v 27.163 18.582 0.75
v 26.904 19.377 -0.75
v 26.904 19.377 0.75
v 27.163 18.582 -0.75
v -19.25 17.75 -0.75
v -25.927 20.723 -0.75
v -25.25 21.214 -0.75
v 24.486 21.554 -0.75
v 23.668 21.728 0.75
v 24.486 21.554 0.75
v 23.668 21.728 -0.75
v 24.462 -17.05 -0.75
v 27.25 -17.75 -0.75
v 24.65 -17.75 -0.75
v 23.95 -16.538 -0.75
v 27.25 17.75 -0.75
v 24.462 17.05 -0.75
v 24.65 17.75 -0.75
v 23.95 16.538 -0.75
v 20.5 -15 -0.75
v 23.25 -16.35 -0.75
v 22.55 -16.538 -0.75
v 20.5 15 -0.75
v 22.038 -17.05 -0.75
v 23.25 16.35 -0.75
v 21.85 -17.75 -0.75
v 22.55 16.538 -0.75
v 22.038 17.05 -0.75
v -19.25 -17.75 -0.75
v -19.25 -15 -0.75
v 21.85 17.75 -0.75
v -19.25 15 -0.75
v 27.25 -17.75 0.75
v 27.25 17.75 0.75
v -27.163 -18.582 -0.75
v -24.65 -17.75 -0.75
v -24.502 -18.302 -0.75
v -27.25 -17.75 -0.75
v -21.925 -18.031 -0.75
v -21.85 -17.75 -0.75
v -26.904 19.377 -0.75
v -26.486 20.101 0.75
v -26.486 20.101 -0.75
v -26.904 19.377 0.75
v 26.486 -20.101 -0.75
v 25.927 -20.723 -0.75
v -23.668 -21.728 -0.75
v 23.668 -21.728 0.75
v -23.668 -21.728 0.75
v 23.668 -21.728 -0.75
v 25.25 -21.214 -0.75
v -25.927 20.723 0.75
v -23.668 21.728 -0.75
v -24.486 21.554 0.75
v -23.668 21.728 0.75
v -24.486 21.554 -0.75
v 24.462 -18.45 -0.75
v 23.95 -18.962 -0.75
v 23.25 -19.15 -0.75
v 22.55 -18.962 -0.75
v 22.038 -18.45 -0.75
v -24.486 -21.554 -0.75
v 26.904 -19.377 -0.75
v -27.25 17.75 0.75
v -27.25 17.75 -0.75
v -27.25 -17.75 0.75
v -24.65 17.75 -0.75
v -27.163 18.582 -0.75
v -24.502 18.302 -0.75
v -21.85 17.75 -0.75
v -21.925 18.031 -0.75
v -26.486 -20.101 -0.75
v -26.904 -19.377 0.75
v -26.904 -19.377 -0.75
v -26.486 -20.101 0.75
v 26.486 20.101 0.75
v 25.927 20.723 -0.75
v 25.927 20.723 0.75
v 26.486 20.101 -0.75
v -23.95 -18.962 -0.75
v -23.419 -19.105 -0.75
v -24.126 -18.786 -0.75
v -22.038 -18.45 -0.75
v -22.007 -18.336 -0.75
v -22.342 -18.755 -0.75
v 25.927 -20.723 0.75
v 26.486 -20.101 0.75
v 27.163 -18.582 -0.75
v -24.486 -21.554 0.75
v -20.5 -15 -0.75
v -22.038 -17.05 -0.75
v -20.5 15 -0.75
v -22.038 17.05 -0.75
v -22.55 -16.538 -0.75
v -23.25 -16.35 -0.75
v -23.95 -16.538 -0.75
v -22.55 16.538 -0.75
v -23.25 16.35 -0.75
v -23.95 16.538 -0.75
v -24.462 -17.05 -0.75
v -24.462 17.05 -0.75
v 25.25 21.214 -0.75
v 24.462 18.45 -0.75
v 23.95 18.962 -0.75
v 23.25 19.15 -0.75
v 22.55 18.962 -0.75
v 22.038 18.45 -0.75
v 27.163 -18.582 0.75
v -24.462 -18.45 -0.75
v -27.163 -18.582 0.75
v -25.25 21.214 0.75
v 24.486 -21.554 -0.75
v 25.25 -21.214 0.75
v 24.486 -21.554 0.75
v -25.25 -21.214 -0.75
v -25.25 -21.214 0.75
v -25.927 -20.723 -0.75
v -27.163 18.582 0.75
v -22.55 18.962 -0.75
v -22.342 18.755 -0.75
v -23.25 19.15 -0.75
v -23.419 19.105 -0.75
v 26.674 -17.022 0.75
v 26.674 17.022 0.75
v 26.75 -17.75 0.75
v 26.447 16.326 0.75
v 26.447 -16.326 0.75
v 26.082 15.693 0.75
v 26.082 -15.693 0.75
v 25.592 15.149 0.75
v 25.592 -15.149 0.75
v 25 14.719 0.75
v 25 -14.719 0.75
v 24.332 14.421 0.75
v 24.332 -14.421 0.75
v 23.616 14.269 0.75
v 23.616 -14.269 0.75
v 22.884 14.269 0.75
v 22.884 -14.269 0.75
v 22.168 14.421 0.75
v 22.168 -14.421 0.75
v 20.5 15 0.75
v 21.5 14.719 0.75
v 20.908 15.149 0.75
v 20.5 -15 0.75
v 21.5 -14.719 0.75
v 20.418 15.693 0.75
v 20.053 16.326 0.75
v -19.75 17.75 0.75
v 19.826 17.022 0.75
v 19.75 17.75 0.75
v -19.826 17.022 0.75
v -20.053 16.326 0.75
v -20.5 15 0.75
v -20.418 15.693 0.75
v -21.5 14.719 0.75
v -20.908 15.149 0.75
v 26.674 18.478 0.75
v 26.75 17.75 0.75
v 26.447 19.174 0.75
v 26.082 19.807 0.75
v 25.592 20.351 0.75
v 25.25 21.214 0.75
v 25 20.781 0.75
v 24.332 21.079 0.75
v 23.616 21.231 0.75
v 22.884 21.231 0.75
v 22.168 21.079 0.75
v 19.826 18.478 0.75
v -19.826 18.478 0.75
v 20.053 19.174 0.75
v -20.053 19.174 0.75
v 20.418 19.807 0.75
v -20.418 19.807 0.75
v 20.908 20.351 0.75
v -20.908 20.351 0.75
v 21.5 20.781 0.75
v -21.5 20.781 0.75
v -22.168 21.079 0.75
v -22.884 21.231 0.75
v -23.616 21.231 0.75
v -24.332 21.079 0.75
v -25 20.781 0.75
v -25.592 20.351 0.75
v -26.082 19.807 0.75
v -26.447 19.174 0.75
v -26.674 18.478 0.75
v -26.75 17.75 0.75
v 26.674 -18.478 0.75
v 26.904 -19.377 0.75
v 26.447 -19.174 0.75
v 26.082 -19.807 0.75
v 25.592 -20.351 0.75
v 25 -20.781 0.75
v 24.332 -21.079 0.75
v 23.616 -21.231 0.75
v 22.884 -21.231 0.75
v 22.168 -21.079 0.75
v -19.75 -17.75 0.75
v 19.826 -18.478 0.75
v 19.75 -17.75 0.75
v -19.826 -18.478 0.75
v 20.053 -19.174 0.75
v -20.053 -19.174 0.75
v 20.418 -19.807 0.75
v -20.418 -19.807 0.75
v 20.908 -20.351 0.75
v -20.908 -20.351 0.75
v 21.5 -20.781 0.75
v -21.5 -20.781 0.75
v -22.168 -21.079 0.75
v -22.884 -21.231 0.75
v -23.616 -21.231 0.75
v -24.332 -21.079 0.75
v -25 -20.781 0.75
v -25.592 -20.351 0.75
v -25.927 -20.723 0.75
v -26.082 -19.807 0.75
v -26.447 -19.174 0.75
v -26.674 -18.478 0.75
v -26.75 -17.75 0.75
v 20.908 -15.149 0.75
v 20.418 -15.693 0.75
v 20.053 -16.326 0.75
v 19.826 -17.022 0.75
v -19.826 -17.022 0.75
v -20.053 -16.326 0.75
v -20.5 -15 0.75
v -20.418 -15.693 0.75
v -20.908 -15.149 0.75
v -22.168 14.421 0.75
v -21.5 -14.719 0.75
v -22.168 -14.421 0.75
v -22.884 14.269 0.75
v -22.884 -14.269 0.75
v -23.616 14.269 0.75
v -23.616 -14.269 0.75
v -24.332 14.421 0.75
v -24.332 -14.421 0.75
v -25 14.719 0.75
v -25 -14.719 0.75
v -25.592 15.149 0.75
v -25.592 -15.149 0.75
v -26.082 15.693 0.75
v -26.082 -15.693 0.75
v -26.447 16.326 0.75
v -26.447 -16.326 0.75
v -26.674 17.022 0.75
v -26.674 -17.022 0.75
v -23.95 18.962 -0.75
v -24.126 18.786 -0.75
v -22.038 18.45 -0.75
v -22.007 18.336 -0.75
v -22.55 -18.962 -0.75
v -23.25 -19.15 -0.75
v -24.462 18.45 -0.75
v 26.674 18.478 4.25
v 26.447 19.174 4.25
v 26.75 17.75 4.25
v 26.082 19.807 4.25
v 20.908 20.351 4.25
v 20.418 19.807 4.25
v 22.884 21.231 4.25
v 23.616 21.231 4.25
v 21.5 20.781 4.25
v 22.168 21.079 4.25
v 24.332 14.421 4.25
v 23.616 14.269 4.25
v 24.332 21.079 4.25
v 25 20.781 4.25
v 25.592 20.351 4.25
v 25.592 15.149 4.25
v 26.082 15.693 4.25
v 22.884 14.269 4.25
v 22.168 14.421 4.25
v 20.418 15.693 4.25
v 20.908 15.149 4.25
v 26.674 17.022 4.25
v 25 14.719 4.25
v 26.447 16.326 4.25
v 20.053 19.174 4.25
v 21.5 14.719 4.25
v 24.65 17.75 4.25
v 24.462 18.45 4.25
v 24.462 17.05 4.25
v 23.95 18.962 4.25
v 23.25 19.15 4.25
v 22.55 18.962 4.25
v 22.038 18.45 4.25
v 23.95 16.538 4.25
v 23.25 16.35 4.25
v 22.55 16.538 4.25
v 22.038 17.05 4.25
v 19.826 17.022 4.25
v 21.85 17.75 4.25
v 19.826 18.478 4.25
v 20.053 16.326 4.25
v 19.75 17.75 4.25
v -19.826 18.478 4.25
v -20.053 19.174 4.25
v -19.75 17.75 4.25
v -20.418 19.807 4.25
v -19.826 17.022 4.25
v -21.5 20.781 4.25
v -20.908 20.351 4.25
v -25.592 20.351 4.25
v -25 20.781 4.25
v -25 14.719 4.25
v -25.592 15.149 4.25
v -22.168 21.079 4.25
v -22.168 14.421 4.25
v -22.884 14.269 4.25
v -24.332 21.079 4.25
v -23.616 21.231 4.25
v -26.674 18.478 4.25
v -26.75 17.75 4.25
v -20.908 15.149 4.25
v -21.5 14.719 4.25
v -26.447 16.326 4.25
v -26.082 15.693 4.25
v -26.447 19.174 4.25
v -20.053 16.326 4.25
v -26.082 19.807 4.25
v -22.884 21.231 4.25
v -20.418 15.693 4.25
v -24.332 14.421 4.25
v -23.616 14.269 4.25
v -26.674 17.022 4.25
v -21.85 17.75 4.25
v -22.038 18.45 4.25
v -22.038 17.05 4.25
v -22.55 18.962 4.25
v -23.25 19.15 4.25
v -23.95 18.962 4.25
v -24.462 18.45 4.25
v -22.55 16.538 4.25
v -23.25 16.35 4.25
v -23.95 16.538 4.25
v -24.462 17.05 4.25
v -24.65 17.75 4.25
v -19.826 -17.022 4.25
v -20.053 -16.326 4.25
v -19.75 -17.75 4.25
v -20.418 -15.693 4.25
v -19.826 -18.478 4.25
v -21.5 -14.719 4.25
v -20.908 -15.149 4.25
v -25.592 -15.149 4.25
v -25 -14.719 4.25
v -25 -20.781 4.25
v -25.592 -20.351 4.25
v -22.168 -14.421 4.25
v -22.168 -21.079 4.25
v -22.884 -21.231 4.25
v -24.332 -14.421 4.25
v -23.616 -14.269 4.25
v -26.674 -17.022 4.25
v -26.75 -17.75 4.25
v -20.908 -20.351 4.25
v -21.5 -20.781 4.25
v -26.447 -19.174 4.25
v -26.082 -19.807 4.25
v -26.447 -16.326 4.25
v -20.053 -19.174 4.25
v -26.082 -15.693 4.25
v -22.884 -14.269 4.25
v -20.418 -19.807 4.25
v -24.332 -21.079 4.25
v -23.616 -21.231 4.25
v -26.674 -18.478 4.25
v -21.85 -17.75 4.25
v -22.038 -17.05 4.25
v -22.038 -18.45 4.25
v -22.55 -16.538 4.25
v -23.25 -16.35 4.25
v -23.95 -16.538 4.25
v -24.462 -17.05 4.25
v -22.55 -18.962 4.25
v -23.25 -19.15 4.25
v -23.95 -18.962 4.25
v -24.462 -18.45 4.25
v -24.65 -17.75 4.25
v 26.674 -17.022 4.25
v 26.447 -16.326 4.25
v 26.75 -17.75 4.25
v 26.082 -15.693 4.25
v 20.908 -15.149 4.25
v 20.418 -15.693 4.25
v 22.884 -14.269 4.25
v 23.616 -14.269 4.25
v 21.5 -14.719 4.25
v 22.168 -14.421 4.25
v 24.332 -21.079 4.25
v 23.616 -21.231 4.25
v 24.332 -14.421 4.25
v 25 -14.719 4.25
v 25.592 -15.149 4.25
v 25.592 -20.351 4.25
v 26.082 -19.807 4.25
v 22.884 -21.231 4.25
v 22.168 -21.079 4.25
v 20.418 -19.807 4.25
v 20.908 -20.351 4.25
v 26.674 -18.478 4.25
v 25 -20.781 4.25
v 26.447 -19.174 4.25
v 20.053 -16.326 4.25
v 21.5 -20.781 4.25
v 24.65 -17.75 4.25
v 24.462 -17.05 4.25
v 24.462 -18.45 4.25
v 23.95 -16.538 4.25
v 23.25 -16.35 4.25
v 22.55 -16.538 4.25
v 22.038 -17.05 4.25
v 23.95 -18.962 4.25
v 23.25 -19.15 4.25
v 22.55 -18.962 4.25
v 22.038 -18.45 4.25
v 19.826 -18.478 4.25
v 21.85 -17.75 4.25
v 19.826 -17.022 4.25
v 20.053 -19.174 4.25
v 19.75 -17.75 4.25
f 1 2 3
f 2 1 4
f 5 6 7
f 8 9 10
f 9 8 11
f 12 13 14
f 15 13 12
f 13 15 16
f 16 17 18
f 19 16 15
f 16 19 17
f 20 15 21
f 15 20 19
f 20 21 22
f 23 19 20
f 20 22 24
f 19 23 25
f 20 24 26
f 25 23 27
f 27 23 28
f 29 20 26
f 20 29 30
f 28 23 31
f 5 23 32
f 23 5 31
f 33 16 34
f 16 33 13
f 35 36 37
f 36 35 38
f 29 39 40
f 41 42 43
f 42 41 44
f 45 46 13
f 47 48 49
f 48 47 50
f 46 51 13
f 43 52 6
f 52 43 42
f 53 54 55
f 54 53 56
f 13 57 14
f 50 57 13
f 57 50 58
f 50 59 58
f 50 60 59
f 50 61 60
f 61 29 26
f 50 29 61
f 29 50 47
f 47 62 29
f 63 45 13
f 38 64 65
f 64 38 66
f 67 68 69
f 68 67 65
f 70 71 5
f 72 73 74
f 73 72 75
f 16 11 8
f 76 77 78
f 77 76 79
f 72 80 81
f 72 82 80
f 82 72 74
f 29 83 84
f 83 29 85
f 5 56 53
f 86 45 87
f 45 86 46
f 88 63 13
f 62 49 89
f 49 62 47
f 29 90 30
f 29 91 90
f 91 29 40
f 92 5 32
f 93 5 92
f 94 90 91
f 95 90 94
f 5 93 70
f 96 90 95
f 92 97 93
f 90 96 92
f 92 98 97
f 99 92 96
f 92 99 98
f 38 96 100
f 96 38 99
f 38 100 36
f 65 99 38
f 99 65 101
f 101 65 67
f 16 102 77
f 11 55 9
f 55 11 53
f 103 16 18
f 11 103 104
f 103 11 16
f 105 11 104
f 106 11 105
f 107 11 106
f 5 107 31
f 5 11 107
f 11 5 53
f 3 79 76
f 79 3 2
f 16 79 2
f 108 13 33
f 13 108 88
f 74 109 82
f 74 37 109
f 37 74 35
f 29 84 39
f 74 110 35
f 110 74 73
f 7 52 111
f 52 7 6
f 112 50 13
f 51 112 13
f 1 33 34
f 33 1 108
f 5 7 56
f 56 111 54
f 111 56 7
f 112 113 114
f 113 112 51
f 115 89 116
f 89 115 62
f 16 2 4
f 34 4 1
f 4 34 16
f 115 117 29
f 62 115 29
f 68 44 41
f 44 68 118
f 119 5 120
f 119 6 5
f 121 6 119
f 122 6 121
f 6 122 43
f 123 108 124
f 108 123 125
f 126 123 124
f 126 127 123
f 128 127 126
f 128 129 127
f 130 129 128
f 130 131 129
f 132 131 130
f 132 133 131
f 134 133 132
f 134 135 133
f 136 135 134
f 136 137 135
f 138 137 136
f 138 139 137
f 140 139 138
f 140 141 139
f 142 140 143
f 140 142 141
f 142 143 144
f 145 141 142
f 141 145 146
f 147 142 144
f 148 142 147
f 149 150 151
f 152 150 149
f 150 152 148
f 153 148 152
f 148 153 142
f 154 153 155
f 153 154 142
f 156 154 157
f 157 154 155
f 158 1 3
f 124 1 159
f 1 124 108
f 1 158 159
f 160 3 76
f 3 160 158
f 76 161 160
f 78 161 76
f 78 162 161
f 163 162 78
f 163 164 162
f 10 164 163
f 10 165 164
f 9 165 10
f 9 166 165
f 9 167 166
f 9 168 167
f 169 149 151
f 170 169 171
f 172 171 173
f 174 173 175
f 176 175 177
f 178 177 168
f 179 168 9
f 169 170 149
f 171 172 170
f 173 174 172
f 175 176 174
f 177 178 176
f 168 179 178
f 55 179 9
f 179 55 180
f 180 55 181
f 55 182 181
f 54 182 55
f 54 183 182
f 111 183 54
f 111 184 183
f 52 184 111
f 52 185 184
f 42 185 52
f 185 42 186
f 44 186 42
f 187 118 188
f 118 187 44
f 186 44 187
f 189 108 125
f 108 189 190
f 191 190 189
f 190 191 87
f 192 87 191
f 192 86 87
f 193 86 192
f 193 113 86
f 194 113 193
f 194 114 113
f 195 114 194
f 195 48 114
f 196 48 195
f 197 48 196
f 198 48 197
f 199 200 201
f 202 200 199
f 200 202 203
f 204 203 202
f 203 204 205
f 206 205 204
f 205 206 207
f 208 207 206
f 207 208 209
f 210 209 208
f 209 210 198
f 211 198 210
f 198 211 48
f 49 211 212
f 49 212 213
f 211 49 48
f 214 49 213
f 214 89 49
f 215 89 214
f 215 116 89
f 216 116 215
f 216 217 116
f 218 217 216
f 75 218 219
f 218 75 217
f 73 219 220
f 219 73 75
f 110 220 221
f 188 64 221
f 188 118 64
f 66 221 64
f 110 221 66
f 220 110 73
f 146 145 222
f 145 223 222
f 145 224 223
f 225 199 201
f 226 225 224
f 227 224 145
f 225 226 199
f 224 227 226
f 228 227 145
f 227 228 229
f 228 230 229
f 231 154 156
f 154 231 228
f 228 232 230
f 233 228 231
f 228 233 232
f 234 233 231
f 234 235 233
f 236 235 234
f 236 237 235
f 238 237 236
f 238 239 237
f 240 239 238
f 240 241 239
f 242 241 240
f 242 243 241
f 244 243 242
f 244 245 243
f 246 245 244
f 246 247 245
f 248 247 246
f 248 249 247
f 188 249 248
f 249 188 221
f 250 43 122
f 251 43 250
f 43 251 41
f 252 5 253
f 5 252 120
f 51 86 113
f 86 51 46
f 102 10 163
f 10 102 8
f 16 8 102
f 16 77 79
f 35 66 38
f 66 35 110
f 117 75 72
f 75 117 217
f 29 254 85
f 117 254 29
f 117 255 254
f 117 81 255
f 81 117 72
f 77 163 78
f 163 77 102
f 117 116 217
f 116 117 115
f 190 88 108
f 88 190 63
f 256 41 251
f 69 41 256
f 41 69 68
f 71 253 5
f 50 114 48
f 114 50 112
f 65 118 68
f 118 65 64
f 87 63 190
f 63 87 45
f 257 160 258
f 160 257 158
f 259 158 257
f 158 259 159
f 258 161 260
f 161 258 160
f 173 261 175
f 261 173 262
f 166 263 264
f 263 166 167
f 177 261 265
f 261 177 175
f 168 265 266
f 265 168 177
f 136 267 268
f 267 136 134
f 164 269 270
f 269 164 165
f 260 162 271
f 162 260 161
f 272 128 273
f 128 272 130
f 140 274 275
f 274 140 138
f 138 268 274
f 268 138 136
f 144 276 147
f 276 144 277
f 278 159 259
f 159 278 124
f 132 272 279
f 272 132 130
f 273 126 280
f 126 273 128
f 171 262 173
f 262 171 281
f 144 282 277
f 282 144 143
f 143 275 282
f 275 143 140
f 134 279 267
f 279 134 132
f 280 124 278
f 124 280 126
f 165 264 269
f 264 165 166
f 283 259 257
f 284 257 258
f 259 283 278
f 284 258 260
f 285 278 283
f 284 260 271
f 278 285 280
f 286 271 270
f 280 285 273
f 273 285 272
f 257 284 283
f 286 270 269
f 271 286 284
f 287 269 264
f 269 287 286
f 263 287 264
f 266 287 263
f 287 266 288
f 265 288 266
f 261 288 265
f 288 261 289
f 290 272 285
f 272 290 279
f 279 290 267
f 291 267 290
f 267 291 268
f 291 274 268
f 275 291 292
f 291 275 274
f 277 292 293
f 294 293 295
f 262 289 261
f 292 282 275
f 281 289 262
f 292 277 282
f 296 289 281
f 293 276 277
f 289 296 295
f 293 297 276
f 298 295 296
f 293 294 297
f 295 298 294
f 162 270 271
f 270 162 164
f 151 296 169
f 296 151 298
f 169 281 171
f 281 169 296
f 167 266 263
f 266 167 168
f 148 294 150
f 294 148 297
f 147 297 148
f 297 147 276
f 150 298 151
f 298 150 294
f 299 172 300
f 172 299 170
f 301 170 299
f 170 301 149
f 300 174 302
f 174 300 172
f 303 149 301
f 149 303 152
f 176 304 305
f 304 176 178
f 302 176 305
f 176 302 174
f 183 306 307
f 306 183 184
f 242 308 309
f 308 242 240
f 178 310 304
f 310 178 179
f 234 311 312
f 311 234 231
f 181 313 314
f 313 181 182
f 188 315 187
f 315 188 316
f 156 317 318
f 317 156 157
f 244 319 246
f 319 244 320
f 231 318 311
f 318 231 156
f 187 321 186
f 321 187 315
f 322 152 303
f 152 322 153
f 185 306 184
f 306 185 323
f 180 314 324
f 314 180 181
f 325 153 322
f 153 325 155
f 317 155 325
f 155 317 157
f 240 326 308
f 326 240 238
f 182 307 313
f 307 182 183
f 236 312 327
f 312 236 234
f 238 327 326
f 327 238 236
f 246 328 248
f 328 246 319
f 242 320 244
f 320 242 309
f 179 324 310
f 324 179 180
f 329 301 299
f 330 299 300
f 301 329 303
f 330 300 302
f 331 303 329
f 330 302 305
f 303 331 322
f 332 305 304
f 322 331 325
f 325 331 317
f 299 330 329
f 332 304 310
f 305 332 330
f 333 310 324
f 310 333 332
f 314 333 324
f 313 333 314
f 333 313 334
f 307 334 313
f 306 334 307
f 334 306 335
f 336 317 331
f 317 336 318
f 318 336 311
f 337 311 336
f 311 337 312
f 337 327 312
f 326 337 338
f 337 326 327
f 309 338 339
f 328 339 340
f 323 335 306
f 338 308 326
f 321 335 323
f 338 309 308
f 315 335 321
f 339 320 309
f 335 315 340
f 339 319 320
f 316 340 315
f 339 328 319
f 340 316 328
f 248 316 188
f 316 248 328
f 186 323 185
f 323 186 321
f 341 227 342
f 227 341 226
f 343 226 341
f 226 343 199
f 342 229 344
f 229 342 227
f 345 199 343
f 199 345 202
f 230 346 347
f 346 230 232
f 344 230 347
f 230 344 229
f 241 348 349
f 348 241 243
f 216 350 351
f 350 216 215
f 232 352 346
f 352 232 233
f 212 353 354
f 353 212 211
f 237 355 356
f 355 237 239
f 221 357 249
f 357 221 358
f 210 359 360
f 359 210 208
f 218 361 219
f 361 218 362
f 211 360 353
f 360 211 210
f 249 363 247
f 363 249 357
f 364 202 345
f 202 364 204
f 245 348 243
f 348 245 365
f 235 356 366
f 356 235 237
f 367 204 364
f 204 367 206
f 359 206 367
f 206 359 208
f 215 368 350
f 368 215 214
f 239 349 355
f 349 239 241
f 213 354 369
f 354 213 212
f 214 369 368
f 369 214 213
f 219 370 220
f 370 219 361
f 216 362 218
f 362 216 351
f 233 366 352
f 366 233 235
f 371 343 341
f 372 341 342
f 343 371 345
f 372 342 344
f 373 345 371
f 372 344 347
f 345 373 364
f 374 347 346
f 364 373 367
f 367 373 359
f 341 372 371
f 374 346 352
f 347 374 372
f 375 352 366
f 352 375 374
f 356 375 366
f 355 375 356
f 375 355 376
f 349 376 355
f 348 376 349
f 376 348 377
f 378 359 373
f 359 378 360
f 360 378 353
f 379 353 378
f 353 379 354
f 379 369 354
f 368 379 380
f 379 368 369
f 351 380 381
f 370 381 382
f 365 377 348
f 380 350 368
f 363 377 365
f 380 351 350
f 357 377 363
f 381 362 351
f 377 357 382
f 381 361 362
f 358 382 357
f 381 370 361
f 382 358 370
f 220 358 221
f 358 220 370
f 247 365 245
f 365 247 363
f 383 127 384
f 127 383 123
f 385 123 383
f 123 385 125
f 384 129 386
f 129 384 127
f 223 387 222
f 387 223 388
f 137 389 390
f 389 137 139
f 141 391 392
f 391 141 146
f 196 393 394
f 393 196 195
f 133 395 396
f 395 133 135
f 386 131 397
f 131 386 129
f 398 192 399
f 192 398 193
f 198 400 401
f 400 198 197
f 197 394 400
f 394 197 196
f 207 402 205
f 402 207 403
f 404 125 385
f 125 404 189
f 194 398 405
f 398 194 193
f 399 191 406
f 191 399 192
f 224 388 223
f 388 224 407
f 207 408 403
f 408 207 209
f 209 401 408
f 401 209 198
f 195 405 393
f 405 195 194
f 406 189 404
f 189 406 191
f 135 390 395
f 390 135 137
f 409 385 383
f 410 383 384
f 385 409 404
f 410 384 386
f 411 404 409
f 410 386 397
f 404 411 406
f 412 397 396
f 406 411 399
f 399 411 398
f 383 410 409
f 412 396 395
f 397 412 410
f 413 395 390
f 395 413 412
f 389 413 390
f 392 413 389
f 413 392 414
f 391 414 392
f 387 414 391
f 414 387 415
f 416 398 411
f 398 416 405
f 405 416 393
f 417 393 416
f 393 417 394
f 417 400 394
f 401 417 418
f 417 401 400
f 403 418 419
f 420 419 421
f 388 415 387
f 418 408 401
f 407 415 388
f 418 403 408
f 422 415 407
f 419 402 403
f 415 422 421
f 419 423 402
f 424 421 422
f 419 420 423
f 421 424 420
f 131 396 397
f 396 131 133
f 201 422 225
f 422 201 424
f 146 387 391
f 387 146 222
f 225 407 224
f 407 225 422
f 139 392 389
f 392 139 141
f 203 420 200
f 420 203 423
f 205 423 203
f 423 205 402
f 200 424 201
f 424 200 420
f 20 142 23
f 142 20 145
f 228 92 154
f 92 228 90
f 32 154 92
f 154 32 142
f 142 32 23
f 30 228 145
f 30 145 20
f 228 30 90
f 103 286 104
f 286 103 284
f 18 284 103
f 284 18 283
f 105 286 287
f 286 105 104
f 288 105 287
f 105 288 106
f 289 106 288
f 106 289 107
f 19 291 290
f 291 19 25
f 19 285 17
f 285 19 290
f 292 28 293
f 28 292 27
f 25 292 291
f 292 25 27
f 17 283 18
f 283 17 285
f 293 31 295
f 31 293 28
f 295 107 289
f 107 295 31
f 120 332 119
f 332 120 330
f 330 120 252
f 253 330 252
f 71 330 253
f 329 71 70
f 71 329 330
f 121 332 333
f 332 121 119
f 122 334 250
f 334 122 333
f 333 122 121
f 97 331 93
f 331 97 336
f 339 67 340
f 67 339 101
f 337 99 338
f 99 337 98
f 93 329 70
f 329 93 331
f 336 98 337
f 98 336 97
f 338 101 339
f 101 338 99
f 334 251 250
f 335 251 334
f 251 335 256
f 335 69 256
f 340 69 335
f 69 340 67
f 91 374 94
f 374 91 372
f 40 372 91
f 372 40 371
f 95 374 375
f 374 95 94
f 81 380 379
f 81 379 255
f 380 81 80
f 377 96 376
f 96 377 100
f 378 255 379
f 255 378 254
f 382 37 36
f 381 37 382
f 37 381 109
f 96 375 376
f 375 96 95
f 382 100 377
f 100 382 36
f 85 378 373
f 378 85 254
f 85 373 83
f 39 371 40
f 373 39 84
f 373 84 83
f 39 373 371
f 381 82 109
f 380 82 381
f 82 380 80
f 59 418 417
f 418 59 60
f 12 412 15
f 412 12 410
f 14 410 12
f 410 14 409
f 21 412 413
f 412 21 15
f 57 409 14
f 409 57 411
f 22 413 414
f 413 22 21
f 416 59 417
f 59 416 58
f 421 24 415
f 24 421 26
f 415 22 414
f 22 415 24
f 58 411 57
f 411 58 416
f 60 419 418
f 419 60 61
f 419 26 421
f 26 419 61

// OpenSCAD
difference(){
union(){
minkowski(){
cube([46.5,35.5,1.5],center=true);
cylinder(d=8,h=0.000001,$fn=30);
}
translate([23.25,17.75,0])cylinder(d=7,h=4.25,$fn=30);
translate([-23.25,17.75,0])cylinder(d=7,h=4.25,$fn=30);
translate([-23.25,-17.75,0])cylinder(d=7,h=4.25,$fn=30);
translate([23.25,-17.75,0])cylinder(d=7,h=4.25,$fn=30);
}
cube([41,30,2.5],center=true);
translate([23.25,17.75,-1])cylinder(d=2.8,h=7,$fn=12);
translate([-23.25,17.75,-1])cylinder(d=2.8,h=7,$fn=12);
translate([-23.25,-17.75,-1])cylinder(d=2.8,h=7,$fn=12);
translate([23.25,-17.75,-1])cylinder(d=2.8,h=7,$fn=12);
}
